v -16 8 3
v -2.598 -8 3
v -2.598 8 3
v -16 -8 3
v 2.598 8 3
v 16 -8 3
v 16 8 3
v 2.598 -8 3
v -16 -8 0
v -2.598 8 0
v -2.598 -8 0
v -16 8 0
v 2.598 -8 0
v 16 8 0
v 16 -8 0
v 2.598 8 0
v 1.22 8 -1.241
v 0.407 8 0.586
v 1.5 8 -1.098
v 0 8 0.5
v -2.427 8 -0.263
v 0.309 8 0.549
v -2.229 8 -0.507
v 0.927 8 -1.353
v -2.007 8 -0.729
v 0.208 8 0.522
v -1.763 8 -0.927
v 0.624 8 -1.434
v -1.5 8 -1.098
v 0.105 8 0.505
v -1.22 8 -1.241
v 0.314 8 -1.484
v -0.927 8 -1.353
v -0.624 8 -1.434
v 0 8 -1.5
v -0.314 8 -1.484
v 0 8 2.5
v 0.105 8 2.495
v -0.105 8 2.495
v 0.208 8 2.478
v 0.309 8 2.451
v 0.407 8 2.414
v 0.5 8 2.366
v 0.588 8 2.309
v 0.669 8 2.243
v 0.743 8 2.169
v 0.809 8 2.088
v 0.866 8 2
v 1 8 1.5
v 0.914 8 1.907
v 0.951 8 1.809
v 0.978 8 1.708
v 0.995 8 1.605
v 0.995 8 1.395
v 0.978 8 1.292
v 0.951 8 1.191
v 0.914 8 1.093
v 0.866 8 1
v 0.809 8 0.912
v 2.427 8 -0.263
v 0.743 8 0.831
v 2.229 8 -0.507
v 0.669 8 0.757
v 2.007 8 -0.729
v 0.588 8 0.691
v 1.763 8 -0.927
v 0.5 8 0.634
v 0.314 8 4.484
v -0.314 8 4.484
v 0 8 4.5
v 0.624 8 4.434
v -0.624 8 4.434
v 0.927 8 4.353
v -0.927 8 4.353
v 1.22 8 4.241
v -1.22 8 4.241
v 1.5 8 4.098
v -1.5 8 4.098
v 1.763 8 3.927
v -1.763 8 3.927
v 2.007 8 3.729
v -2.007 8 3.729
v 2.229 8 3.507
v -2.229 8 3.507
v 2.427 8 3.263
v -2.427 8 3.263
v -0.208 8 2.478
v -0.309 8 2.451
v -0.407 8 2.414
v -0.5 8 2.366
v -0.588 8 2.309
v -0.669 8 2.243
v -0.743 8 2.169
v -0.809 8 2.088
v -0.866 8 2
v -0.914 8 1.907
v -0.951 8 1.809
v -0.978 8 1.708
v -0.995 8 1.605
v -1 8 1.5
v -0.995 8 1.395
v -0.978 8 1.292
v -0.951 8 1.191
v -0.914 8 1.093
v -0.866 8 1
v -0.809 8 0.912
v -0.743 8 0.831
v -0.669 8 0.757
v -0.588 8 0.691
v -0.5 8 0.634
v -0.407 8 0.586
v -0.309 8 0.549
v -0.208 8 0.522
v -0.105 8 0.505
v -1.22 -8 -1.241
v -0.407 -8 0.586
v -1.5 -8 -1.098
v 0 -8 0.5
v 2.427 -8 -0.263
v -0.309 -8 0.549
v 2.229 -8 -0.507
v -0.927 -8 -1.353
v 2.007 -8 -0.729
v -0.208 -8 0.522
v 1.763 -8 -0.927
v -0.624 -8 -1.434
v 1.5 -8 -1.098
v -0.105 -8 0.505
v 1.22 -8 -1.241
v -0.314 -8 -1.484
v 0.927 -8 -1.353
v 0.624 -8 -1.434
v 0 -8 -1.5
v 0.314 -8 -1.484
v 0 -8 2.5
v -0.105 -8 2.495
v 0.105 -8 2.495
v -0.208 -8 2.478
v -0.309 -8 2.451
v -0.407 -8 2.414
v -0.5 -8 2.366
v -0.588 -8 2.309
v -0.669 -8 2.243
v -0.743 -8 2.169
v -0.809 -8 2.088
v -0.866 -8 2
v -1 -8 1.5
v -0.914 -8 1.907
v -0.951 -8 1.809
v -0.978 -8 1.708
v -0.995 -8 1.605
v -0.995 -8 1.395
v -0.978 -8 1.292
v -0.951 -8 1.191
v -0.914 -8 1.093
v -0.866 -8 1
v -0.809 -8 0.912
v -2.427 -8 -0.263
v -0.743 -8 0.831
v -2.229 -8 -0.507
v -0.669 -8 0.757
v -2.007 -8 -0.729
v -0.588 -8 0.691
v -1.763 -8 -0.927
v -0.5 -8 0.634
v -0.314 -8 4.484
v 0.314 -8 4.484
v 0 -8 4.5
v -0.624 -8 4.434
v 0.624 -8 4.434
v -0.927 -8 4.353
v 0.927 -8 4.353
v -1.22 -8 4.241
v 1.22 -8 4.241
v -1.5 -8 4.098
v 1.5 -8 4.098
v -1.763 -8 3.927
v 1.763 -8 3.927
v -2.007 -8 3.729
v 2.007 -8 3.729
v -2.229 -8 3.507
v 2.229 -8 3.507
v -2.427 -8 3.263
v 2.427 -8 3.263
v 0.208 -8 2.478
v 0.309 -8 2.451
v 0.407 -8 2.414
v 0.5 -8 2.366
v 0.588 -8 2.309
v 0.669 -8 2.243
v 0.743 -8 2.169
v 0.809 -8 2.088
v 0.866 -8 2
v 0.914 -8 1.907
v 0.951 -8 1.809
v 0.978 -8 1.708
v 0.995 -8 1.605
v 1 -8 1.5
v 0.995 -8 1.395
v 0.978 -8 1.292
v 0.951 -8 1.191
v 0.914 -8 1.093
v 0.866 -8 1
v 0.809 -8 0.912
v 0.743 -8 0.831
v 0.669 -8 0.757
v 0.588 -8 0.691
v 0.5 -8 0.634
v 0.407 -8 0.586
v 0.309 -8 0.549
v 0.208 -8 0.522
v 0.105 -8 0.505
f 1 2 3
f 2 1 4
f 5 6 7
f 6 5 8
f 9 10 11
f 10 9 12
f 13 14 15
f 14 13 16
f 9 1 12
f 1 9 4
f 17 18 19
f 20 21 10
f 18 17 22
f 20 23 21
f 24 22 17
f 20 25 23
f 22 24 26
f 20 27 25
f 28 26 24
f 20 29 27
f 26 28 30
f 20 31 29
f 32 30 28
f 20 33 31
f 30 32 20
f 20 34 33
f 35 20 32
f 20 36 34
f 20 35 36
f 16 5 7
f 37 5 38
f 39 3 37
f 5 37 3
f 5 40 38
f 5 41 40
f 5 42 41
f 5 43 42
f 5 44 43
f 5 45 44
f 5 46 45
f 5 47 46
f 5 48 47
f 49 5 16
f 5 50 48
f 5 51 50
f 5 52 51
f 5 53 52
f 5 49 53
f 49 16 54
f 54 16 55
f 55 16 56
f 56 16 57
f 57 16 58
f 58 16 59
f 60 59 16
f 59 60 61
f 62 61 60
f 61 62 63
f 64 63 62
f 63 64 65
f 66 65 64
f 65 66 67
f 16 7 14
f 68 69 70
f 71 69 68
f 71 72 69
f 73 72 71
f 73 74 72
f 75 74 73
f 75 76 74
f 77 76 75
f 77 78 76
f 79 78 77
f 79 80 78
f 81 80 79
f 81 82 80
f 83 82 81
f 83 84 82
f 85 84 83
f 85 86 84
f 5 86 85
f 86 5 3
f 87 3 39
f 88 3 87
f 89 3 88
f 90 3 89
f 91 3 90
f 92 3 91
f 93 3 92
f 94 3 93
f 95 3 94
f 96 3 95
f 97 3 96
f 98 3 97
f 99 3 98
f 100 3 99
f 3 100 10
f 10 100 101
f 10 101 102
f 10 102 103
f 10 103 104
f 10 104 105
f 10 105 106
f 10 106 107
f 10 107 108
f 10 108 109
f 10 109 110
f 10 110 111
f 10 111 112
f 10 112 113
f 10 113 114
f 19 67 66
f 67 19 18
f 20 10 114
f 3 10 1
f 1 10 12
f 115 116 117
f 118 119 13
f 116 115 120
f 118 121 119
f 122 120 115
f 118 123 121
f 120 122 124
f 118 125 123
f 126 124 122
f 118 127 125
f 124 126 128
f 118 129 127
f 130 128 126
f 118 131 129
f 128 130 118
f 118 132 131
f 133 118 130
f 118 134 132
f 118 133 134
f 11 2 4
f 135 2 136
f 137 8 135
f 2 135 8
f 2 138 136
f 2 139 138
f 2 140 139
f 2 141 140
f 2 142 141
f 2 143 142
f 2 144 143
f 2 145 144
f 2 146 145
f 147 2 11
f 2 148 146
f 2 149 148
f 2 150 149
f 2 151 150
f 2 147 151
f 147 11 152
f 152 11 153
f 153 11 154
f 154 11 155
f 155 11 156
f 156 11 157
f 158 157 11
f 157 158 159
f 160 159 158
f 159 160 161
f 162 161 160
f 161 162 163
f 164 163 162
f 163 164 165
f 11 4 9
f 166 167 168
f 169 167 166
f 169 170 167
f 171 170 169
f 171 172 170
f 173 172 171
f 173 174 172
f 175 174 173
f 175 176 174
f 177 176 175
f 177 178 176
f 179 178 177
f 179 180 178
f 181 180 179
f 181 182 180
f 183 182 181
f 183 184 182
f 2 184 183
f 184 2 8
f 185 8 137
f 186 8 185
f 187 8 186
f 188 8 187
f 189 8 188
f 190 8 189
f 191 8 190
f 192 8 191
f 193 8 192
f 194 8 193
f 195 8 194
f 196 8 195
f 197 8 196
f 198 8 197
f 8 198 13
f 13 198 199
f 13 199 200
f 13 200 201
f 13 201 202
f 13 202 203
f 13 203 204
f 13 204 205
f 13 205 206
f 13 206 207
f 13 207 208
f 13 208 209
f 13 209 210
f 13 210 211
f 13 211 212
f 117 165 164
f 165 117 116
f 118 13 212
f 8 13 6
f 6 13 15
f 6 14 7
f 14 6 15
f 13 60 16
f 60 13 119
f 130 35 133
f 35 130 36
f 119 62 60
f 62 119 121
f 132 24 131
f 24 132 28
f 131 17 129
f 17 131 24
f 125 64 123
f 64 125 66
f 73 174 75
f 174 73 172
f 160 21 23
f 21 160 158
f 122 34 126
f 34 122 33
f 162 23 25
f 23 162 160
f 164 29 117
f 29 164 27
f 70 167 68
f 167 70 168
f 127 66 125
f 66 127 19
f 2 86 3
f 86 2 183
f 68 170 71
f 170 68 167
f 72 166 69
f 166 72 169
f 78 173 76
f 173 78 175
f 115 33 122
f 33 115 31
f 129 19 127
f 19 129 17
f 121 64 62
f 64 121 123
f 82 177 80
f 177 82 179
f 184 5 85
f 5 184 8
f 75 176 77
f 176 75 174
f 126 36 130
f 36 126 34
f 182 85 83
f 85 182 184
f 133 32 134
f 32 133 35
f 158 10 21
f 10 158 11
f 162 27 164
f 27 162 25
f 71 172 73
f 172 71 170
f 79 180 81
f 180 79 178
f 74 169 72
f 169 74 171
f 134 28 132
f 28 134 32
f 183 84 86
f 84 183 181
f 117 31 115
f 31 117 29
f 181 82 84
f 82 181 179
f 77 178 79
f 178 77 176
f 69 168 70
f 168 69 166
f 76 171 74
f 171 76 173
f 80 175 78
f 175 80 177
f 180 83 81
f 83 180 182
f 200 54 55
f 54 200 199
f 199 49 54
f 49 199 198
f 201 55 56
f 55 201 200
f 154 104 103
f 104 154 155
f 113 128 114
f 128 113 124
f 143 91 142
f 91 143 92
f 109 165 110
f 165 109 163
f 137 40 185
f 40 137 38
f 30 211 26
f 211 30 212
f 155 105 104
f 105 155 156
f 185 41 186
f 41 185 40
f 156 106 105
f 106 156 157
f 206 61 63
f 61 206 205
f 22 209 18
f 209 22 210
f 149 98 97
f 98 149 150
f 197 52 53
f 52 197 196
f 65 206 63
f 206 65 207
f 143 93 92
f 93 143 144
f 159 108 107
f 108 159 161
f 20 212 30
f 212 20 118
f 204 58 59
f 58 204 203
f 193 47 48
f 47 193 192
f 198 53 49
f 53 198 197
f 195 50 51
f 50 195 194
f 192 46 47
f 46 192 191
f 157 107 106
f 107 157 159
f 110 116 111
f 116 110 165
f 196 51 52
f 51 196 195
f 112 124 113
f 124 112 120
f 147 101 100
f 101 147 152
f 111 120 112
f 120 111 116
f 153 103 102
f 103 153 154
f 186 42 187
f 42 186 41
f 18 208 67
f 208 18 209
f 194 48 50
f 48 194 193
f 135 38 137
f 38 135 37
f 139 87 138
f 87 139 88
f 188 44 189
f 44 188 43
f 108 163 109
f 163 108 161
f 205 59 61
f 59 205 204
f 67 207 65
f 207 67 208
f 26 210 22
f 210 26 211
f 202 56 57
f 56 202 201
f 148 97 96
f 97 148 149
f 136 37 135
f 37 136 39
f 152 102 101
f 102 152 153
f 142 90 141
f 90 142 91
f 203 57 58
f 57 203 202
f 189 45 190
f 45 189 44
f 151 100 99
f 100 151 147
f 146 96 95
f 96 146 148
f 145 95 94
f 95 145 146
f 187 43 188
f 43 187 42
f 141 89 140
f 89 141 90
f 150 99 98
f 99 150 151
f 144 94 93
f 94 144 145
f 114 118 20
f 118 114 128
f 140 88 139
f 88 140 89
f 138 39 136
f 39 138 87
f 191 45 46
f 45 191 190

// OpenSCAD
// Compact plate hinge.
$fn = 60;
eps = 0.02;
leaf_l = 16;
width = 16;
pin_d = 2;
leaf_t = 3;
difference() {
    union() {
        translate([-leaf_l,-width/2,0]) cube([leaf_l,width,leaf_t]);
        translate([0,-width/2,0]) cube([leaf_l,width,leaf_t]);
        translate([0,-width/2,leaf_t/2]) rotate([-90,0,0]) cylinder(d=pin_d+4,h=width);
    }
    translate([0,-width/2-eps,leaf_t/2]) rotate([-90,0,0]) cylinder(d=pin_d,h=width+2*eps);
}
